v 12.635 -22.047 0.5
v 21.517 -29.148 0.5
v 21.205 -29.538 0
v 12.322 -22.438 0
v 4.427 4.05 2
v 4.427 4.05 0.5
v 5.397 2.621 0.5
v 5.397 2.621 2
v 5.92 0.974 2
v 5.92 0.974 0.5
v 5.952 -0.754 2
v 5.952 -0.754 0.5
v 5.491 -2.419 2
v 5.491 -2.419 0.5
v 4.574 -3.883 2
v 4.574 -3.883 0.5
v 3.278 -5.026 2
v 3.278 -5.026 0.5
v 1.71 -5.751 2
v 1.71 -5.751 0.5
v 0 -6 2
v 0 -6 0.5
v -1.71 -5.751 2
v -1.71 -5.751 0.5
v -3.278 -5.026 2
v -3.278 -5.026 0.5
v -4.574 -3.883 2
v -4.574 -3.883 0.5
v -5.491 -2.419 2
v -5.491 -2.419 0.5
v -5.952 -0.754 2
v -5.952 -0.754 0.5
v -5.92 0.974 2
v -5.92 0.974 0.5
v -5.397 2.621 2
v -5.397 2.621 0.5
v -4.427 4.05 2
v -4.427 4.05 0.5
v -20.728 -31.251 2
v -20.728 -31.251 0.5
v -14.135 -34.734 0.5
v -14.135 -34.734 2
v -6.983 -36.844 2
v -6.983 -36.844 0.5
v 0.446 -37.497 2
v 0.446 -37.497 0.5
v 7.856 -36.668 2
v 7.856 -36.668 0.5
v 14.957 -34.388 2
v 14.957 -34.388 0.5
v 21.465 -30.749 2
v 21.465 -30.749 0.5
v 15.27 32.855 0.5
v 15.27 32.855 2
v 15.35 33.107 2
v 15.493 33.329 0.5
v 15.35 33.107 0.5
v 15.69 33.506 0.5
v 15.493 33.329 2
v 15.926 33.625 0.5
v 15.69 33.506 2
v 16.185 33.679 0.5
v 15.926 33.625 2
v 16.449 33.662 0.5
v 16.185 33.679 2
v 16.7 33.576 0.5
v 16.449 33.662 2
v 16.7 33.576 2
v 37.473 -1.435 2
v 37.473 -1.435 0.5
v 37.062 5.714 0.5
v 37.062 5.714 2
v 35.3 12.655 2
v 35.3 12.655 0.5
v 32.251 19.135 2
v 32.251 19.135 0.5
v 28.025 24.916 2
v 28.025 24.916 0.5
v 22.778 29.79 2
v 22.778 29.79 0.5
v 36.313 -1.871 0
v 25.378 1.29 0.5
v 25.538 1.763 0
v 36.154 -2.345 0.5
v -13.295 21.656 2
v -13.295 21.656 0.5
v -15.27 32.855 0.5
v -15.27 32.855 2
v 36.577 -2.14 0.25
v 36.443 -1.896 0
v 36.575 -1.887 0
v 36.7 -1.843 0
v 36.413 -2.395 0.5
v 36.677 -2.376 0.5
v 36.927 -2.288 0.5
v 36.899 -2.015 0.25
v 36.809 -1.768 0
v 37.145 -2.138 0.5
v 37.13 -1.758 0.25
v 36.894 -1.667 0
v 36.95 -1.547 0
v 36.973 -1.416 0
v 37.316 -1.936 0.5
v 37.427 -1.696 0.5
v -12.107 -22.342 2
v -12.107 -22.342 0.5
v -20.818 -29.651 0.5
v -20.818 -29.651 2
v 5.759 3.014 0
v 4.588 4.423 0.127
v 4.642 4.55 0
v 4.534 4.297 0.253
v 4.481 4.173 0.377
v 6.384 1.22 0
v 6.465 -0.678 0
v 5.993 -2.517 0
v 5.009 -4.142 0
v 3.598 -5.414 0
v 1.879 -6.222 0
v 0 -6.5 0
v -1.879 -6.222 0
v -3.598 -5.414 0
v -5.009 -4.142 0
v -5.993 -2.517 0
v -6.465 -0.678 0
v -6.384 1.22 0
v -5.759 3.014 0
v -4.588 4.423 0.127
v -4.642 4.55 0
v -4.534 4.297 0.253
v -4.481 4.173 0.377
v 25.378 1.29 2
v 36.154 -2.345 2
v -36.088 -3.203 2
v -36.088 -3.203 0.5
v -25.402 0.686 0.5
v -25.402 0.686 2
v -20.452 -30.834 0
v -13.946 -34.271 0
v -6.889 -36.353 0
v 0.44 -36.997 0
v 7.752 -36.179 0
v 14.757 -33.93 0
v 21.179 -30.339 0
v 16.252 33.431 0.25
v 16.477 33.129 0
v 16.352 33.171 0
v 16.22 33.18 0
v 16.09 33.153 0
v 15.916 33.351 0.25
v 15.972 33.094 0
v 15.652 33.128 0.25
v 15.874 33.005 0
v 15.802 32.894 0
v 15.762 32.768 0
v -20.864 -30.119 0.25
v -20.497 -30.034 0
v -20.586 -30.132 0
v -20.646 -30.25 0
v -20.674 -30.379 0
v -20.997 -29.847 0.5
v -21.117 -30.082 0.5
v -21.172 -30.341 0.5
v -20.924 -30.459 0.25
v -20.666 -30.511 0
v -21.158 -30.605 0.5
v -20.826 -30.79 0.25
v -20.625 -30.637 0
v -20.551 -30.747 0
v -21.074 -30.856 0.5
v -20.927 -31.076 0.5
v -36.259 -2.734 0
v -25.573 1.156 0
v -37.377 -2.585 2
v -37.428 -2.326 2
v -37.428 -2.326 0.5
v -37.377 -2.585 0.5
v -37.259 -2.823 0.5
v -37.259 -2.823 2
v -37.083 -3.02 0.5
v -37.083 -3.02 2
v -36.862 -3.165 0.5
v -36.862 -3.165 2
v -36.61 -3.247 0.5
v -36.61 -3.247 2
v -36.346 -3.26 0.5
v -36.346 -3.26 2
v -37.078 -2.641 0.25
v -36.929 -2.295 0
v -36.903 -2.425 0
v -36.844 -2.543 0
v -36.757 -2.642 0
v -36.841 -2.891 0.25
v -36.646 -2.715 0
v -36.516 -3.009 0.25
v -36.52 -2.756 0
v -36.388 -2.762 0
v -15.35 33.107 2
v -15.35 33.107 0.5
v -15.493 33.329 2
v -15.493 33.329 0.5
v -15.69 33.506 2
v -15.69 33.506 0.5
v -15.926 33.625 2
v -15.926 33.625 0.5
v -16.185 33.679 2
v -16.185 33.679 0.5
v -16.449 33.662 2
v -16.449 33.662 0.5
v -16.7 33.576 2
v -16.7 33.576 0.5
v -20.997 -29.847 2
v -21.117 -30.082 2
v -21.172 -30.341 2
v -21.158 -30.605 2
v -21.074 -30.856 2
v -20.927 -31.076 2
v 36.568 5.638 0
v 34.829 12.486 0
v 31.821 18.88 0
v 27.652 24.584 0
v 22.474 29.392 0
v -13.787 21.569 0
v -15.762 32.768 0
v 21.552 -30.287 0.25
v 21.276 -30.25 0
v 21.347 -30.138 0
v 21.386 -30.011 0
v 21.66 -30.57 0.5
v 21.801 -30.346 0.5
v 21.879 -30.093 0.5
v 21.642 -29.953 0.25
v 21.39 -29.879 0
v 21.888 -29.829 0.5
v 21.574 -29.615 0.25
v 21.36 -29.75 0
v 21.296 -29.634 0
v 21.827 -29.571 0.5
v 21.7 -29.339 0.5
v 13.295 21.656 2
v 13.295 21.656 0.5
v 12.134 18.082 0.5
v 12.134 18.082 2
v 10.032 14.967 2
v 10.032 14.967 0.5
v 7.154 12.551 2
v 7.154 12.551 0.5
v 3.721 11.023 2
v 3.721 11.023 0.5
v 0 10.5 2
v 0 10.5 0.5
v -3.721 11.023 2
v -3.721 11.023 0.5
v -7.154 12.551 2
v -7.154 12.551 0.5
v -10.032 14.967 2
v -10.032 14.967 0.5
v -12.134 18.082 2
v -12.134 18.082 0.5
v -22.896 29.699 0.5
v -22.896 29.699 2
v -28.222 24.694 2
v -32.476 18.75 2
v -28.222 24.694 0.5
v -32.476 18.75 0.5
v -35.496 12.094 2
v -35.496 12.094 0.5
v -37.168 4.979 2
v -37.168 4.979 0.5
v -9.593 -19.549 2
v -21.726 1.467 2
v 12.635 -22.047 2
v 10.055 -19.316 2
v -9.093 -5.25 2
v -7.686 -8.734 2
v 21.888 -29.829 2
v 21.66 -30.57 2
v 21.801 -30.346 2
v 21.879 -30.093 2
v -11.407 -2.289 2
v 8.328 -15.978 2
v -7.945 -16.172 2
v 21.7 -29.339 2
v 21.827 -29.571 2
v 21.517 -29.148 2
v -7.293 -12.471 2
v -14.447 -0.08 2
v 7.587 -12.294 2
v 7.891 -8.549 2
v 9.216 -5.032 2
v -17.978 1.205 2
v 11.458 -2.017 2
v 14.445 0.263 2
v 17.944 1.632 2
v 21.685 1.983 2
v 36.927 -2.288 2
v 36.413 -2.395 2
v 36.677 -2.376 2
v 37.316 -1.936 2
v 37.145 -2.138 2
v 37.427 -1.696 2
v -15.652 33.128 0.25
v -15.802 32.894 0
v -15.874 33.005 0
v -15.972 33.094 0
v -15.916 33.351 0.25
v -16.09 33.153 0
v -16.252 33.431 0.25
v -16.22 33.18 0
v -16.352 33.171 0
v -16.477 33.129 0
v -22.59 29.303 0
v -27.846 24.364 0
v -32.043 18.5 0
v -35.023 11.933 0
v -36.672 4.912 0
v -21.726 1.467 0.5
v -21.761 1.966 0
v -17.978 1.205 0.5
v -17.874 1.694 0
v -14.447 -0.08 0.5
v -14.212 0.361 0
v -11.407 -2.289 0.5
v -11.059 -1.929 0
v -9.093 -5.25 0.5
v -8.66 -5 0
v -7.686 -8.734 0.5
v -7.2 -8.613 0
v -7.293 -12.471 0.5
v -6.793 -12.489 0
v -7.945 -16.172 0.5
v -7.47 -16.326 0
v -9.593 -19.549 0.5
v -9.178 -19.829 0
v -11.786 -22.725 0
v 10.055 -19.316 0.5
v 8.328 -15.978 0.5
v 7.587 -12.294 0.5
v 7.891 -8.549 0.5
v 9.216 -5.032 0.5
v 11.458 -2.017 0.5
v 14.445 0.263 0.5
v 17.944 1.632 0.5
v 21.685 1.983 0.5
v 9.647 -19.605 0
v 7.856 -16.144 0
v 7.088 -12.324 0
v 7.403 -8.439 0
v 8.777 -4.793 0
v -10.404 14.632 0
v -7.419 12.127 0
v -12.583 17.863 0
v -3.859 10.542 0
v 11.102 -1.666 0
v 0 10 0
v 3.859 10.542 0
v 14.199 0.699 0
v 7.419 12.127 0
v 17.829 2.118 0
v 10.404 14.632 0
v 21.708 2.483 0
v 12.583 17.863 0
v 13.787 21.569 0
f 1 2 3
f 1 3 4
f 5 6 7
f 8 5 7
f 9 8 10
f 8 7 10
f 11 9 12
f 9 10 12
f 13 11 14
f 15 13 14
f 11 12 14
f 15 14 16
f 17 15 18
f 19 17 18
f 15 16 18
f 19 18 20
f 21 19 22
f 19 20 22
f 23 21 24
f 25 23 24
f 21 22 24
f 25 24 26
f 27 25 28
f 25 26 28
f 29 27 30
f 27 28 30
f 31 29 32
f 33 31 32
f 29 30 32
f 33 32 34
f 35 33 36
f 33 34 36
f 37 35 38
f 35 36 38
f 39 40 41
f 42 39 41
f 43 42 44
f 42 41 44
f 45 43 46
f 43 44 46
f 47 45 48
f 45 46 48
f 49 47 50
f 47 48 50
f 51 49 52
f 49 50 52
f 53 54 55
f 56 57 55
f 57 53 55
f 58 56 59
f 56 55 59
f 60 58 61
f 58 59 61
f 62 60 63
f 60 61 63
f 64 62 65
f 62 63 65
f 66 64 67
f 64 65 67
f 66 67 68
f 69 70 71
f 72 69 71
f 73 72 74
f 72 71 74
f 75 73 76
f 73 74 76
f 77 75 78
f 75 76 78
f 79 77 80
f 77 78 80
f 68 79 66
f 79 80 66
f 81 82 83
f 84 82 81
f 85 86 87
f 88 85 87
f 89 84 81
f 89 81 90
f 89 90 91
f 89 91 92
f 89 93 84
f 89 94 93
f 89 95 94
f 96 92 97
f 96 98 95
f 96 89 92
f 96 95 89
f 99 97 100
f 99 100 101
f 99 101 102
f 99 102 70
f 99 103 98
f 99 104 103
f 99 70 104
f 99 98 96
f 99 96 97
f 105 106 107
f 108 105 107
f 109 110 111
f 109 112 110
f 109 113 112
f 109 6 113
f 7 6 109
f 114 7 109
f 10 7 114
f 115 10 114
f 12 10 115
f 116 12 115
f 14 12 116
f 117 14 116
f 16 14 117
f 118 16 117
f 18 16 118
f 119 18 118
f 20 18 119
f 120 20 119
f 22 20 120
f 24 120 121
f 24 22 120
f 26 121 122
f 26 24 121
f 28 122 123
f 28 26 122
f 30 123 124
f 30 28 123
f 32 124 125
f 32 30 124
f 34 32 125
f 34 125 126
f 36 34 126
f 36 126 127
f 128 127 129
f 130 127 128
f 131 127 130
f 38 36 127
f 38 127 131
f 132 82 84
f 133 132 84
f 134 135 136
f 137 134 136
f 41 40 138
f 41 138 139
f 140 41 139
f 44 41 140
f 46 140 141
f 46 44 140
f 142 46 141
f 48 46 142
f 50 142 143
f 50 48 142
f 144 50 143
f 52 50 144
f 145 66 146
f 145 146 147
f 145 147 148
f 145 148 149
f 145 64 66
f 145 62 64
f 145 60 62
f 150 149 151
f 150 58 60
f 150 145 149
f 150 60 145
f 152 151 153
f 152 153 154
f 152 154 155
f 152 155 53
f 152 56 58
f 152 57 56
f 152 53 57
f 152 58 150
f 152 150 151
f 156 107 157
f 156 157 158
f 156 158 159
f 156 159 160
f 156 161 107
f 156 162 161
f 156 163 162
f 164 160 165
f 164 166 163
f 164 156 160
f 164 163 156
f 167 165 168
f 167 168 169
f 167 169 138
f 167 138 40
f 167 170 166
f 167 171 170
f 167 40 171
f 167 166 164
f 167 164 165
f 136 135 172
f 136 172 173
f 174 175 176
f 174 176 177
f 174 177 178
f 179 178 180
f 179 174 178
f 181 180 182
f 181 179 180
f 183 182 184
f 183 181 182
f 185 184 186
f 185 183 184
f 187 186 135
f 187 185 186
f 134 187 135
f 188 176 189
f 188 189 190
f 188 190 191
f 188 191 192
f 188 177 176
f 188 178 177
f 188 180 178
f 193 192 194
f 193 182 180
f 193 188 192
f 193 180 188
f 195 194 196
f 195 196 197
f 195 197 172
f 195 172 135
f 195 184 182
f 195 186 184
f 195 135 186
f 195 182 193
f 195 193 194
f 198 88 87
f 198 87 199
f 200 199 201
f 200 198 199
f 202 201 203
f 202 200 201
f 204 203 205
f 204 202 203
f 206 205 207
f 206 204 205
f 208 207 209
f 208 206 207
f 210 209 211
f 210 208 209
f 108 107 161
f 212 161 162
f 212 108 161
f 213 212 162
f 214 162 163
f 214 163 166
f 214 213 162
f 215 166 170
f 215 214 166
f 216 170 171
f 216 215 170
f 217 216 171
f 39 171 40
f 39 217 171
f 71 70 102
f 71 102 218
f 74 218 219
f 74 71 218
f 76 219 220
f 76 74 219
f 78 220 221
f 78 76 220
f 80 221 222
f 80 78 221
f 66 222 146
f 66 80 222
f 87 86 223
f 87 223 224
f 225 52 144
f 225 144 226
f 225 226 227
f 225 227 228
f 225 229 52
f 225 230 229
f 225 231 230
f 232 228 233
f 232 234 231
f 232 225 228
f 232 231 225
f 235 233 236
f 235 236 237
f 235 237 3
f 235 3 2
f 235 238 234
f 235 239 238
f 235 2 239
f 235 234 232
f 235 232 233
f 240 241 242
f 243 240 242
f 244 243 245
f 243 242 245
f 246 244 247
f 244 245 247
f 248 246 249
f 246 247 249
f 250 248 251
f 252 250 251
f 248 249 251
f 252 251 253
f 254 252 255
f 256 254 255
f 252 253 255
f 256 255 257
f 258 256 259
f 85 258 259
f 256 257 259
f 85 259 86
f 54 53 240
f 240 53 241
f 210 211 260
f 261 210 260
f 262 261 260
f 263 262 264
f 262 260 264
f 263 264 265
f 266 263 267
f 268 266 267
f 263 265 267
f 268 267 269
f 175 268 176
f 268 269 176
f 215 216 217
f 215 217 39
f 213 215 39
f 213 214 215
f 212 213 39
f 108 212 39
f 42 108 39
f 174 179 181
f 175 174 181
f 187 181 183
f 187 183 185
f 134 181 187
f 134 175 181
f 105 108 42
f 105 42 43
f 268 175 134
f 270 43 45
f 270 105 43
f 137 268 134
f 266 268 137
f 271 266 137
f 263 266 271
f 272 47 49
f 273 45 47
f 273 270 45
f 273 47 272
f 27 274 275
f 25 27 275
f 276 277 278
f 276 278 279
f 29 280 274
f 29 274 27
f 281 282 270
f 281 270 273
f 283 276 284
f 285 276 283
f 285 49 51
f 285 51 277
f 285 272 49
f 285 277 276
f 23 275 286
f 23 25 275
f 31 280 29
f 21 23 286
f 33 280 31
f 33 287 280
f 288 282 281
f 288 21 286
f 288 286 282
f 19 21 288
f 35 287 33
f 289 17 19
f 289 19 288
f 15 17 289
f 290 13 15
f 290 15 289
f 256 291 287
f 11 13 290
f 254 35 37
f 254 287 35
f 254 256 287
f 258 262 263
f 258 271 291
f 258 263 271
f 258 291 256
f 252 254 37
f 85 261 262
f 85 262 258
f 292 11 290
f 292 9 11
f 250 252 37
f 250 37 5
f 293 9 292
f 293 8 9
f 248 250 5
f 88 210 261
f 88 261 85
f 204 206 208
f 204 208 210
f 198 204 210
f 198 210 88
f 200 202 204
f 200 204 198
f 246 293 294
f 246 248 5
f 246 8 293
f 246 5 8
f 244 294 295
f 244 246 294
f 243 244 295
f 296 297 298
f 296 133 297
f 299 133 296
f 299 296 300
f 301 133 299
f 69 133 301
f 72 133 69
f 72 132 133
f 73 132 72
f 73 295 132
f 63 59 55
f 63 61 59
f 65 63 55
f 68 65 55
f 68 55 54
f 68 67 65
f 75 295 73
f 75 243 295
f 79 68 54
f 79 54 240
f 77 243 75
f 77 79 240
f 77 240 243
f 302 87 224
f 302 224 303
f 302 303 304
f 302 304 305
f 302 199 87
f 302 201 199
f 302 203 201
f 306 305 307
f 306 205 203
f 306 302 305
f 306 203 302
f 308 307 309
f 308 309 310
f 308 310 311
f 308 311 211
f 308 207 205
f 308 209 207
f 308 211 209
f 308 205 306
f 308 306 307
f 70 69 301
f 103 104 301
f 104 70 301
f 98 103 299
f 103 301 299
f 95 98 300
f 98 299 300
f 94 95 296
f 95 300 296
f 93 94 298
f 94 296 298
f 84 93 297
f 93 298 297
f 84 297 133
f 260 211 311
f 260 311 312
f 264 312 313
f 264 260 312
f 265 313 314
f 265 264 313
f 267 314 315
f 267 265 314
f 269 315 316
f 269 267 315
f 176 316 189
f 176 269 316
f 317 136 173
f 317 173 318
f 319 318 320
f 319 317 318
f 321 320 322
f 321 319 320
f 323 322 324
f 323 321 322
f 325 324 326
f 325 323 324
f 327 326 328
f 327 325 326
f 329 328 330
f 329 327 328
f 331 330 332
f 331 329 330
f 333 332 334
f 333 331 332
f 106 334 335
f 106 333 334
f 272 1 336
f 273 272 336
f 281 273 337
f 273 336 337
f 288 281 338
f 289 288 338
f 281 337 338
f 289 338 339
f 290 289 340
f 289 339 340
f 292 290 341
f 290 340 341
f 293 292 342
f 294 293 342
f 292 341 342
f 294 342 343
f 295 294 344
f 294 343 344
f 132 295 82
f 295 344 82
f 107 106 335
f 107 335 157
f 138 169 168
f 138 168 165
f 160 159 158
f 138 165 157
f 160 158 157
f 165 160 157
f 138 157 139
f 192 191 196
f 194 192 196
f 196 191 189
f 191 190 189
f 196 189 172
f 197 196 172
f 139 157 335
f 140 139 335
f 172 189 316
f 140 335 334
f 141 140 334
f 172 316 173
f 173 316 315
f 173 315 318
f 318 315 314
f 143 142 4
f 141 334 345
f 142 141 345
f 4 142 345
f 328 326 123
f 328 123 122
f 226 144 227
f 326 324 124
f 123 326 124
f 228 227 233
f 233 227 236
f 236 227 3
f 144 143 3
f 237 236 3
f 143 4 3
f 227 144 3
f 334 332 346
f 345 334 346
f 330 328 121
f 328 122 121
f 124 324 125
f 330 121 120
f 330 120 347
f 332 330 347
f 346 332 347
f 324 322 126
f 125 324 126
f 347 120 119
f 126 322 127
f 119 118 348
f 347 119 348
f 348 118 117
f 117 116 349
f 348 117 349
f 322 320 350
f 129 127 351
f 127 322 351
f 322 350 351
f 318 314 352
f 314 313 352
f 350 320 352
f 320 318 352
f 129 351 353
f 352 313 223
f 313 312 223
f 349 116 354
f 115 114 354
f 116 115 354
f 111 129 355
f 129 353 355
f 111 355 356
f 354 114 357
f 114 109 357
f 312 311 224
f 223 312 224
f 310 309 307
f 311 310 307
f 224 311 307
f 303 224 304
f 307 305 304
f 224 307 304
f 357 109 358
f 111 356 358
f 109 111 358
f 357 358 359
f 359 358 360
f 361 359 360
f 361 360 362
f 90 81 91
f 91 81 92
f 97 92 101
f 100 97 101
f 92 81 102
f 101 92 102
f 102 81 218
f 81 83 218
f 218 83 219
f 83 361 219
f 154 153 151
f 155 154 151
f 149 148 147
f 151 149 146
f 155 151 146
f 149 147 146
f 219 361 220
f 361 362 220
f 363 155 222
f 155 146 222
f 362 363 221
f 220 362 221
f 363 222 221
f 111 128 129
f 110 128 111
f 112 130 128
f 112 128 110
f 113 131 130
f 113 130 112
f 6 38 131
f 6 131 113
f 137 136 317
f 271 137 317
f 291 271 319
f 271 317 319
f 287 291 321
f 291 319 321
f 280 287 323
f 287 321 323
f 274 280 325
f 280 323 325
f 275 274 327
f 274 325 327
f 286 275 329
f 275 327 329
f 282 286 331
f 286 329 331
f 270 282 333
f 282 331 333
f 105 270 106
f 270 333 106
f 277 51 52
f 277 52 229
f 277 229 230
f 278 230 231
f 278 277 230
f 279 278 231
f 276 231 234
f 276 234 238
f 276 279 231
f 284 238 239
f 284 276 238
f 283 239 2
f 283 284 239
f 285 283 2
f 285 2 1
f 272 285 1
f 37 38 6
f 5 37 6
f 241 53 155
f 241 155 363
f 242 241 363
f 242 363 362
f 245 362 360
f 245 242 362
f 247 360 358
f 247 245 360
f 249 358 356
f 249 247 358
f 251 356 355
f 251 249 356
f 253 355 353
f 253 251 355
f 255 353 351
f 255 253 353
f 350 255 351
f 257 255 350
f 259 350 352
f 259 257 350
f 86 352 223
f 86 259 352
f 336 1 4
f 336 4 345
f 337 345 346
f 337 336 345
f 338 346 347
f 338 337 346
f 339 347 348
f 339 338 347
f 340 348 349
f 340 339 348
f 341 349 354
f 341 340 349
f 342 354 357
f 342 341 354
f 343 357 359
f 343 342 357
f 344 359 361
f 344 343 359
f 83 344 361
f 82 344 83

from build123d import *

# Parameters (mm, degrees)
F1_DEPTH = 2
F2_R     = 1
F3_SIZE  = 0.5


with BuildPart() as f1:
    # F0 (on Top) → F1 (new body)
    with BuildSketch(Plane.XY):
        with BuildLine():
            Line((-13.294905, 21.65575), (-15.497596, 34.147833))
            ThreePointArc((-15.497596, 34.147833), (-32.475953, 18.75), (-37.321689, -3.652605))
            Line((-37.321689, -3.652605), (-25.401882, 0.68585))
            ThreePointArc((-25.401882, 0.68585), (-9.093267, -5.25), (-12.106977, -22.3416))
            Line((-12.106977, -22.3416), (-21.824093, -30.495229))
            ThreePointArc((-21.824093, -30.495229), (0.445759, -37.497351), (22.542862, -29.967806))
            Line((22.542862, -29.967806), (12.634663, -22.047478))
            ThreePointArc((12.634663, -22.047478), (9.215501, -5.03235), (25.378399, 1.289513))
            Line((25.378399, 1.289513), (37.397972, -2.764357))
            ThreePointArc((37.397972, -2.764357), (32.250779, 19.134714), (15.497596, 34.147833))
            Line((15.497596, 34.147833), (13.294905, 21.65575))
            ThreePointArc((13.294905, 21.65575), (0, 10.5), (-13.294905, 21.65575))
        make_face()
        with BuildLine():
            ThreePointArc((4.426906, 4.05), (0, -6), (-4.426906, 4.05))
            Line((-4.426906, 4.05), (4.426906, 4.05))
        make_face(mode=Mode.SUBTRACT)
    extrude(amount=F1_DEPTH)

    # F2
    f2_edges = [f1.edges().sort_by_distance(p)[0] for p in [
        (22.542862, -29.967806, 1),
        (37.397972, -2.764357, 1),
        (-21.824093, -30.495229, 1),
        (-37.321689, -3.652605, 1),
        (-15.497596, 34.147833, 1),
        (15.497596, 34.147833, 1),
    ]]
    fillet(f2_edges, radius=F2_R)

    # F3
    f3_edges = [f1.edges().sort_by_distance(p)[0] for p in [
        (30.766032, -0.527587, 0),
        (37.040868, -2.220421, 0),
        (9.215501, -5.03235, 0),
        (32.250779, 19.134714, 0),
        (17.075898, -25.597672, 0),
        (15.80384, 33.573722, 0),
        (21.89221, -29.961431, 0),
        (14.282235, 27.25518, 0),
        (0.445759, -37.497351, 0),
        (0, 10.5, 0),
        (-21.173776, -30.473388, 0),
        (-14.282235, 27.25518, 0),
        (-16.462561, -25.996369, 0),
        (-15.80384, 33.573722, 0),
        (-9.093267, -5.25, 0),
        (-32.475953, 18.75, 0),
        (-30.744796, -1.258811, 0),
        (-36.977617, -3.100334, 0),
        (0, -6, 0),
        (0, 4.05, 0),
    ]]
    chamfer(f3_edges, length=F3_SIZE)


solid = f1.part
